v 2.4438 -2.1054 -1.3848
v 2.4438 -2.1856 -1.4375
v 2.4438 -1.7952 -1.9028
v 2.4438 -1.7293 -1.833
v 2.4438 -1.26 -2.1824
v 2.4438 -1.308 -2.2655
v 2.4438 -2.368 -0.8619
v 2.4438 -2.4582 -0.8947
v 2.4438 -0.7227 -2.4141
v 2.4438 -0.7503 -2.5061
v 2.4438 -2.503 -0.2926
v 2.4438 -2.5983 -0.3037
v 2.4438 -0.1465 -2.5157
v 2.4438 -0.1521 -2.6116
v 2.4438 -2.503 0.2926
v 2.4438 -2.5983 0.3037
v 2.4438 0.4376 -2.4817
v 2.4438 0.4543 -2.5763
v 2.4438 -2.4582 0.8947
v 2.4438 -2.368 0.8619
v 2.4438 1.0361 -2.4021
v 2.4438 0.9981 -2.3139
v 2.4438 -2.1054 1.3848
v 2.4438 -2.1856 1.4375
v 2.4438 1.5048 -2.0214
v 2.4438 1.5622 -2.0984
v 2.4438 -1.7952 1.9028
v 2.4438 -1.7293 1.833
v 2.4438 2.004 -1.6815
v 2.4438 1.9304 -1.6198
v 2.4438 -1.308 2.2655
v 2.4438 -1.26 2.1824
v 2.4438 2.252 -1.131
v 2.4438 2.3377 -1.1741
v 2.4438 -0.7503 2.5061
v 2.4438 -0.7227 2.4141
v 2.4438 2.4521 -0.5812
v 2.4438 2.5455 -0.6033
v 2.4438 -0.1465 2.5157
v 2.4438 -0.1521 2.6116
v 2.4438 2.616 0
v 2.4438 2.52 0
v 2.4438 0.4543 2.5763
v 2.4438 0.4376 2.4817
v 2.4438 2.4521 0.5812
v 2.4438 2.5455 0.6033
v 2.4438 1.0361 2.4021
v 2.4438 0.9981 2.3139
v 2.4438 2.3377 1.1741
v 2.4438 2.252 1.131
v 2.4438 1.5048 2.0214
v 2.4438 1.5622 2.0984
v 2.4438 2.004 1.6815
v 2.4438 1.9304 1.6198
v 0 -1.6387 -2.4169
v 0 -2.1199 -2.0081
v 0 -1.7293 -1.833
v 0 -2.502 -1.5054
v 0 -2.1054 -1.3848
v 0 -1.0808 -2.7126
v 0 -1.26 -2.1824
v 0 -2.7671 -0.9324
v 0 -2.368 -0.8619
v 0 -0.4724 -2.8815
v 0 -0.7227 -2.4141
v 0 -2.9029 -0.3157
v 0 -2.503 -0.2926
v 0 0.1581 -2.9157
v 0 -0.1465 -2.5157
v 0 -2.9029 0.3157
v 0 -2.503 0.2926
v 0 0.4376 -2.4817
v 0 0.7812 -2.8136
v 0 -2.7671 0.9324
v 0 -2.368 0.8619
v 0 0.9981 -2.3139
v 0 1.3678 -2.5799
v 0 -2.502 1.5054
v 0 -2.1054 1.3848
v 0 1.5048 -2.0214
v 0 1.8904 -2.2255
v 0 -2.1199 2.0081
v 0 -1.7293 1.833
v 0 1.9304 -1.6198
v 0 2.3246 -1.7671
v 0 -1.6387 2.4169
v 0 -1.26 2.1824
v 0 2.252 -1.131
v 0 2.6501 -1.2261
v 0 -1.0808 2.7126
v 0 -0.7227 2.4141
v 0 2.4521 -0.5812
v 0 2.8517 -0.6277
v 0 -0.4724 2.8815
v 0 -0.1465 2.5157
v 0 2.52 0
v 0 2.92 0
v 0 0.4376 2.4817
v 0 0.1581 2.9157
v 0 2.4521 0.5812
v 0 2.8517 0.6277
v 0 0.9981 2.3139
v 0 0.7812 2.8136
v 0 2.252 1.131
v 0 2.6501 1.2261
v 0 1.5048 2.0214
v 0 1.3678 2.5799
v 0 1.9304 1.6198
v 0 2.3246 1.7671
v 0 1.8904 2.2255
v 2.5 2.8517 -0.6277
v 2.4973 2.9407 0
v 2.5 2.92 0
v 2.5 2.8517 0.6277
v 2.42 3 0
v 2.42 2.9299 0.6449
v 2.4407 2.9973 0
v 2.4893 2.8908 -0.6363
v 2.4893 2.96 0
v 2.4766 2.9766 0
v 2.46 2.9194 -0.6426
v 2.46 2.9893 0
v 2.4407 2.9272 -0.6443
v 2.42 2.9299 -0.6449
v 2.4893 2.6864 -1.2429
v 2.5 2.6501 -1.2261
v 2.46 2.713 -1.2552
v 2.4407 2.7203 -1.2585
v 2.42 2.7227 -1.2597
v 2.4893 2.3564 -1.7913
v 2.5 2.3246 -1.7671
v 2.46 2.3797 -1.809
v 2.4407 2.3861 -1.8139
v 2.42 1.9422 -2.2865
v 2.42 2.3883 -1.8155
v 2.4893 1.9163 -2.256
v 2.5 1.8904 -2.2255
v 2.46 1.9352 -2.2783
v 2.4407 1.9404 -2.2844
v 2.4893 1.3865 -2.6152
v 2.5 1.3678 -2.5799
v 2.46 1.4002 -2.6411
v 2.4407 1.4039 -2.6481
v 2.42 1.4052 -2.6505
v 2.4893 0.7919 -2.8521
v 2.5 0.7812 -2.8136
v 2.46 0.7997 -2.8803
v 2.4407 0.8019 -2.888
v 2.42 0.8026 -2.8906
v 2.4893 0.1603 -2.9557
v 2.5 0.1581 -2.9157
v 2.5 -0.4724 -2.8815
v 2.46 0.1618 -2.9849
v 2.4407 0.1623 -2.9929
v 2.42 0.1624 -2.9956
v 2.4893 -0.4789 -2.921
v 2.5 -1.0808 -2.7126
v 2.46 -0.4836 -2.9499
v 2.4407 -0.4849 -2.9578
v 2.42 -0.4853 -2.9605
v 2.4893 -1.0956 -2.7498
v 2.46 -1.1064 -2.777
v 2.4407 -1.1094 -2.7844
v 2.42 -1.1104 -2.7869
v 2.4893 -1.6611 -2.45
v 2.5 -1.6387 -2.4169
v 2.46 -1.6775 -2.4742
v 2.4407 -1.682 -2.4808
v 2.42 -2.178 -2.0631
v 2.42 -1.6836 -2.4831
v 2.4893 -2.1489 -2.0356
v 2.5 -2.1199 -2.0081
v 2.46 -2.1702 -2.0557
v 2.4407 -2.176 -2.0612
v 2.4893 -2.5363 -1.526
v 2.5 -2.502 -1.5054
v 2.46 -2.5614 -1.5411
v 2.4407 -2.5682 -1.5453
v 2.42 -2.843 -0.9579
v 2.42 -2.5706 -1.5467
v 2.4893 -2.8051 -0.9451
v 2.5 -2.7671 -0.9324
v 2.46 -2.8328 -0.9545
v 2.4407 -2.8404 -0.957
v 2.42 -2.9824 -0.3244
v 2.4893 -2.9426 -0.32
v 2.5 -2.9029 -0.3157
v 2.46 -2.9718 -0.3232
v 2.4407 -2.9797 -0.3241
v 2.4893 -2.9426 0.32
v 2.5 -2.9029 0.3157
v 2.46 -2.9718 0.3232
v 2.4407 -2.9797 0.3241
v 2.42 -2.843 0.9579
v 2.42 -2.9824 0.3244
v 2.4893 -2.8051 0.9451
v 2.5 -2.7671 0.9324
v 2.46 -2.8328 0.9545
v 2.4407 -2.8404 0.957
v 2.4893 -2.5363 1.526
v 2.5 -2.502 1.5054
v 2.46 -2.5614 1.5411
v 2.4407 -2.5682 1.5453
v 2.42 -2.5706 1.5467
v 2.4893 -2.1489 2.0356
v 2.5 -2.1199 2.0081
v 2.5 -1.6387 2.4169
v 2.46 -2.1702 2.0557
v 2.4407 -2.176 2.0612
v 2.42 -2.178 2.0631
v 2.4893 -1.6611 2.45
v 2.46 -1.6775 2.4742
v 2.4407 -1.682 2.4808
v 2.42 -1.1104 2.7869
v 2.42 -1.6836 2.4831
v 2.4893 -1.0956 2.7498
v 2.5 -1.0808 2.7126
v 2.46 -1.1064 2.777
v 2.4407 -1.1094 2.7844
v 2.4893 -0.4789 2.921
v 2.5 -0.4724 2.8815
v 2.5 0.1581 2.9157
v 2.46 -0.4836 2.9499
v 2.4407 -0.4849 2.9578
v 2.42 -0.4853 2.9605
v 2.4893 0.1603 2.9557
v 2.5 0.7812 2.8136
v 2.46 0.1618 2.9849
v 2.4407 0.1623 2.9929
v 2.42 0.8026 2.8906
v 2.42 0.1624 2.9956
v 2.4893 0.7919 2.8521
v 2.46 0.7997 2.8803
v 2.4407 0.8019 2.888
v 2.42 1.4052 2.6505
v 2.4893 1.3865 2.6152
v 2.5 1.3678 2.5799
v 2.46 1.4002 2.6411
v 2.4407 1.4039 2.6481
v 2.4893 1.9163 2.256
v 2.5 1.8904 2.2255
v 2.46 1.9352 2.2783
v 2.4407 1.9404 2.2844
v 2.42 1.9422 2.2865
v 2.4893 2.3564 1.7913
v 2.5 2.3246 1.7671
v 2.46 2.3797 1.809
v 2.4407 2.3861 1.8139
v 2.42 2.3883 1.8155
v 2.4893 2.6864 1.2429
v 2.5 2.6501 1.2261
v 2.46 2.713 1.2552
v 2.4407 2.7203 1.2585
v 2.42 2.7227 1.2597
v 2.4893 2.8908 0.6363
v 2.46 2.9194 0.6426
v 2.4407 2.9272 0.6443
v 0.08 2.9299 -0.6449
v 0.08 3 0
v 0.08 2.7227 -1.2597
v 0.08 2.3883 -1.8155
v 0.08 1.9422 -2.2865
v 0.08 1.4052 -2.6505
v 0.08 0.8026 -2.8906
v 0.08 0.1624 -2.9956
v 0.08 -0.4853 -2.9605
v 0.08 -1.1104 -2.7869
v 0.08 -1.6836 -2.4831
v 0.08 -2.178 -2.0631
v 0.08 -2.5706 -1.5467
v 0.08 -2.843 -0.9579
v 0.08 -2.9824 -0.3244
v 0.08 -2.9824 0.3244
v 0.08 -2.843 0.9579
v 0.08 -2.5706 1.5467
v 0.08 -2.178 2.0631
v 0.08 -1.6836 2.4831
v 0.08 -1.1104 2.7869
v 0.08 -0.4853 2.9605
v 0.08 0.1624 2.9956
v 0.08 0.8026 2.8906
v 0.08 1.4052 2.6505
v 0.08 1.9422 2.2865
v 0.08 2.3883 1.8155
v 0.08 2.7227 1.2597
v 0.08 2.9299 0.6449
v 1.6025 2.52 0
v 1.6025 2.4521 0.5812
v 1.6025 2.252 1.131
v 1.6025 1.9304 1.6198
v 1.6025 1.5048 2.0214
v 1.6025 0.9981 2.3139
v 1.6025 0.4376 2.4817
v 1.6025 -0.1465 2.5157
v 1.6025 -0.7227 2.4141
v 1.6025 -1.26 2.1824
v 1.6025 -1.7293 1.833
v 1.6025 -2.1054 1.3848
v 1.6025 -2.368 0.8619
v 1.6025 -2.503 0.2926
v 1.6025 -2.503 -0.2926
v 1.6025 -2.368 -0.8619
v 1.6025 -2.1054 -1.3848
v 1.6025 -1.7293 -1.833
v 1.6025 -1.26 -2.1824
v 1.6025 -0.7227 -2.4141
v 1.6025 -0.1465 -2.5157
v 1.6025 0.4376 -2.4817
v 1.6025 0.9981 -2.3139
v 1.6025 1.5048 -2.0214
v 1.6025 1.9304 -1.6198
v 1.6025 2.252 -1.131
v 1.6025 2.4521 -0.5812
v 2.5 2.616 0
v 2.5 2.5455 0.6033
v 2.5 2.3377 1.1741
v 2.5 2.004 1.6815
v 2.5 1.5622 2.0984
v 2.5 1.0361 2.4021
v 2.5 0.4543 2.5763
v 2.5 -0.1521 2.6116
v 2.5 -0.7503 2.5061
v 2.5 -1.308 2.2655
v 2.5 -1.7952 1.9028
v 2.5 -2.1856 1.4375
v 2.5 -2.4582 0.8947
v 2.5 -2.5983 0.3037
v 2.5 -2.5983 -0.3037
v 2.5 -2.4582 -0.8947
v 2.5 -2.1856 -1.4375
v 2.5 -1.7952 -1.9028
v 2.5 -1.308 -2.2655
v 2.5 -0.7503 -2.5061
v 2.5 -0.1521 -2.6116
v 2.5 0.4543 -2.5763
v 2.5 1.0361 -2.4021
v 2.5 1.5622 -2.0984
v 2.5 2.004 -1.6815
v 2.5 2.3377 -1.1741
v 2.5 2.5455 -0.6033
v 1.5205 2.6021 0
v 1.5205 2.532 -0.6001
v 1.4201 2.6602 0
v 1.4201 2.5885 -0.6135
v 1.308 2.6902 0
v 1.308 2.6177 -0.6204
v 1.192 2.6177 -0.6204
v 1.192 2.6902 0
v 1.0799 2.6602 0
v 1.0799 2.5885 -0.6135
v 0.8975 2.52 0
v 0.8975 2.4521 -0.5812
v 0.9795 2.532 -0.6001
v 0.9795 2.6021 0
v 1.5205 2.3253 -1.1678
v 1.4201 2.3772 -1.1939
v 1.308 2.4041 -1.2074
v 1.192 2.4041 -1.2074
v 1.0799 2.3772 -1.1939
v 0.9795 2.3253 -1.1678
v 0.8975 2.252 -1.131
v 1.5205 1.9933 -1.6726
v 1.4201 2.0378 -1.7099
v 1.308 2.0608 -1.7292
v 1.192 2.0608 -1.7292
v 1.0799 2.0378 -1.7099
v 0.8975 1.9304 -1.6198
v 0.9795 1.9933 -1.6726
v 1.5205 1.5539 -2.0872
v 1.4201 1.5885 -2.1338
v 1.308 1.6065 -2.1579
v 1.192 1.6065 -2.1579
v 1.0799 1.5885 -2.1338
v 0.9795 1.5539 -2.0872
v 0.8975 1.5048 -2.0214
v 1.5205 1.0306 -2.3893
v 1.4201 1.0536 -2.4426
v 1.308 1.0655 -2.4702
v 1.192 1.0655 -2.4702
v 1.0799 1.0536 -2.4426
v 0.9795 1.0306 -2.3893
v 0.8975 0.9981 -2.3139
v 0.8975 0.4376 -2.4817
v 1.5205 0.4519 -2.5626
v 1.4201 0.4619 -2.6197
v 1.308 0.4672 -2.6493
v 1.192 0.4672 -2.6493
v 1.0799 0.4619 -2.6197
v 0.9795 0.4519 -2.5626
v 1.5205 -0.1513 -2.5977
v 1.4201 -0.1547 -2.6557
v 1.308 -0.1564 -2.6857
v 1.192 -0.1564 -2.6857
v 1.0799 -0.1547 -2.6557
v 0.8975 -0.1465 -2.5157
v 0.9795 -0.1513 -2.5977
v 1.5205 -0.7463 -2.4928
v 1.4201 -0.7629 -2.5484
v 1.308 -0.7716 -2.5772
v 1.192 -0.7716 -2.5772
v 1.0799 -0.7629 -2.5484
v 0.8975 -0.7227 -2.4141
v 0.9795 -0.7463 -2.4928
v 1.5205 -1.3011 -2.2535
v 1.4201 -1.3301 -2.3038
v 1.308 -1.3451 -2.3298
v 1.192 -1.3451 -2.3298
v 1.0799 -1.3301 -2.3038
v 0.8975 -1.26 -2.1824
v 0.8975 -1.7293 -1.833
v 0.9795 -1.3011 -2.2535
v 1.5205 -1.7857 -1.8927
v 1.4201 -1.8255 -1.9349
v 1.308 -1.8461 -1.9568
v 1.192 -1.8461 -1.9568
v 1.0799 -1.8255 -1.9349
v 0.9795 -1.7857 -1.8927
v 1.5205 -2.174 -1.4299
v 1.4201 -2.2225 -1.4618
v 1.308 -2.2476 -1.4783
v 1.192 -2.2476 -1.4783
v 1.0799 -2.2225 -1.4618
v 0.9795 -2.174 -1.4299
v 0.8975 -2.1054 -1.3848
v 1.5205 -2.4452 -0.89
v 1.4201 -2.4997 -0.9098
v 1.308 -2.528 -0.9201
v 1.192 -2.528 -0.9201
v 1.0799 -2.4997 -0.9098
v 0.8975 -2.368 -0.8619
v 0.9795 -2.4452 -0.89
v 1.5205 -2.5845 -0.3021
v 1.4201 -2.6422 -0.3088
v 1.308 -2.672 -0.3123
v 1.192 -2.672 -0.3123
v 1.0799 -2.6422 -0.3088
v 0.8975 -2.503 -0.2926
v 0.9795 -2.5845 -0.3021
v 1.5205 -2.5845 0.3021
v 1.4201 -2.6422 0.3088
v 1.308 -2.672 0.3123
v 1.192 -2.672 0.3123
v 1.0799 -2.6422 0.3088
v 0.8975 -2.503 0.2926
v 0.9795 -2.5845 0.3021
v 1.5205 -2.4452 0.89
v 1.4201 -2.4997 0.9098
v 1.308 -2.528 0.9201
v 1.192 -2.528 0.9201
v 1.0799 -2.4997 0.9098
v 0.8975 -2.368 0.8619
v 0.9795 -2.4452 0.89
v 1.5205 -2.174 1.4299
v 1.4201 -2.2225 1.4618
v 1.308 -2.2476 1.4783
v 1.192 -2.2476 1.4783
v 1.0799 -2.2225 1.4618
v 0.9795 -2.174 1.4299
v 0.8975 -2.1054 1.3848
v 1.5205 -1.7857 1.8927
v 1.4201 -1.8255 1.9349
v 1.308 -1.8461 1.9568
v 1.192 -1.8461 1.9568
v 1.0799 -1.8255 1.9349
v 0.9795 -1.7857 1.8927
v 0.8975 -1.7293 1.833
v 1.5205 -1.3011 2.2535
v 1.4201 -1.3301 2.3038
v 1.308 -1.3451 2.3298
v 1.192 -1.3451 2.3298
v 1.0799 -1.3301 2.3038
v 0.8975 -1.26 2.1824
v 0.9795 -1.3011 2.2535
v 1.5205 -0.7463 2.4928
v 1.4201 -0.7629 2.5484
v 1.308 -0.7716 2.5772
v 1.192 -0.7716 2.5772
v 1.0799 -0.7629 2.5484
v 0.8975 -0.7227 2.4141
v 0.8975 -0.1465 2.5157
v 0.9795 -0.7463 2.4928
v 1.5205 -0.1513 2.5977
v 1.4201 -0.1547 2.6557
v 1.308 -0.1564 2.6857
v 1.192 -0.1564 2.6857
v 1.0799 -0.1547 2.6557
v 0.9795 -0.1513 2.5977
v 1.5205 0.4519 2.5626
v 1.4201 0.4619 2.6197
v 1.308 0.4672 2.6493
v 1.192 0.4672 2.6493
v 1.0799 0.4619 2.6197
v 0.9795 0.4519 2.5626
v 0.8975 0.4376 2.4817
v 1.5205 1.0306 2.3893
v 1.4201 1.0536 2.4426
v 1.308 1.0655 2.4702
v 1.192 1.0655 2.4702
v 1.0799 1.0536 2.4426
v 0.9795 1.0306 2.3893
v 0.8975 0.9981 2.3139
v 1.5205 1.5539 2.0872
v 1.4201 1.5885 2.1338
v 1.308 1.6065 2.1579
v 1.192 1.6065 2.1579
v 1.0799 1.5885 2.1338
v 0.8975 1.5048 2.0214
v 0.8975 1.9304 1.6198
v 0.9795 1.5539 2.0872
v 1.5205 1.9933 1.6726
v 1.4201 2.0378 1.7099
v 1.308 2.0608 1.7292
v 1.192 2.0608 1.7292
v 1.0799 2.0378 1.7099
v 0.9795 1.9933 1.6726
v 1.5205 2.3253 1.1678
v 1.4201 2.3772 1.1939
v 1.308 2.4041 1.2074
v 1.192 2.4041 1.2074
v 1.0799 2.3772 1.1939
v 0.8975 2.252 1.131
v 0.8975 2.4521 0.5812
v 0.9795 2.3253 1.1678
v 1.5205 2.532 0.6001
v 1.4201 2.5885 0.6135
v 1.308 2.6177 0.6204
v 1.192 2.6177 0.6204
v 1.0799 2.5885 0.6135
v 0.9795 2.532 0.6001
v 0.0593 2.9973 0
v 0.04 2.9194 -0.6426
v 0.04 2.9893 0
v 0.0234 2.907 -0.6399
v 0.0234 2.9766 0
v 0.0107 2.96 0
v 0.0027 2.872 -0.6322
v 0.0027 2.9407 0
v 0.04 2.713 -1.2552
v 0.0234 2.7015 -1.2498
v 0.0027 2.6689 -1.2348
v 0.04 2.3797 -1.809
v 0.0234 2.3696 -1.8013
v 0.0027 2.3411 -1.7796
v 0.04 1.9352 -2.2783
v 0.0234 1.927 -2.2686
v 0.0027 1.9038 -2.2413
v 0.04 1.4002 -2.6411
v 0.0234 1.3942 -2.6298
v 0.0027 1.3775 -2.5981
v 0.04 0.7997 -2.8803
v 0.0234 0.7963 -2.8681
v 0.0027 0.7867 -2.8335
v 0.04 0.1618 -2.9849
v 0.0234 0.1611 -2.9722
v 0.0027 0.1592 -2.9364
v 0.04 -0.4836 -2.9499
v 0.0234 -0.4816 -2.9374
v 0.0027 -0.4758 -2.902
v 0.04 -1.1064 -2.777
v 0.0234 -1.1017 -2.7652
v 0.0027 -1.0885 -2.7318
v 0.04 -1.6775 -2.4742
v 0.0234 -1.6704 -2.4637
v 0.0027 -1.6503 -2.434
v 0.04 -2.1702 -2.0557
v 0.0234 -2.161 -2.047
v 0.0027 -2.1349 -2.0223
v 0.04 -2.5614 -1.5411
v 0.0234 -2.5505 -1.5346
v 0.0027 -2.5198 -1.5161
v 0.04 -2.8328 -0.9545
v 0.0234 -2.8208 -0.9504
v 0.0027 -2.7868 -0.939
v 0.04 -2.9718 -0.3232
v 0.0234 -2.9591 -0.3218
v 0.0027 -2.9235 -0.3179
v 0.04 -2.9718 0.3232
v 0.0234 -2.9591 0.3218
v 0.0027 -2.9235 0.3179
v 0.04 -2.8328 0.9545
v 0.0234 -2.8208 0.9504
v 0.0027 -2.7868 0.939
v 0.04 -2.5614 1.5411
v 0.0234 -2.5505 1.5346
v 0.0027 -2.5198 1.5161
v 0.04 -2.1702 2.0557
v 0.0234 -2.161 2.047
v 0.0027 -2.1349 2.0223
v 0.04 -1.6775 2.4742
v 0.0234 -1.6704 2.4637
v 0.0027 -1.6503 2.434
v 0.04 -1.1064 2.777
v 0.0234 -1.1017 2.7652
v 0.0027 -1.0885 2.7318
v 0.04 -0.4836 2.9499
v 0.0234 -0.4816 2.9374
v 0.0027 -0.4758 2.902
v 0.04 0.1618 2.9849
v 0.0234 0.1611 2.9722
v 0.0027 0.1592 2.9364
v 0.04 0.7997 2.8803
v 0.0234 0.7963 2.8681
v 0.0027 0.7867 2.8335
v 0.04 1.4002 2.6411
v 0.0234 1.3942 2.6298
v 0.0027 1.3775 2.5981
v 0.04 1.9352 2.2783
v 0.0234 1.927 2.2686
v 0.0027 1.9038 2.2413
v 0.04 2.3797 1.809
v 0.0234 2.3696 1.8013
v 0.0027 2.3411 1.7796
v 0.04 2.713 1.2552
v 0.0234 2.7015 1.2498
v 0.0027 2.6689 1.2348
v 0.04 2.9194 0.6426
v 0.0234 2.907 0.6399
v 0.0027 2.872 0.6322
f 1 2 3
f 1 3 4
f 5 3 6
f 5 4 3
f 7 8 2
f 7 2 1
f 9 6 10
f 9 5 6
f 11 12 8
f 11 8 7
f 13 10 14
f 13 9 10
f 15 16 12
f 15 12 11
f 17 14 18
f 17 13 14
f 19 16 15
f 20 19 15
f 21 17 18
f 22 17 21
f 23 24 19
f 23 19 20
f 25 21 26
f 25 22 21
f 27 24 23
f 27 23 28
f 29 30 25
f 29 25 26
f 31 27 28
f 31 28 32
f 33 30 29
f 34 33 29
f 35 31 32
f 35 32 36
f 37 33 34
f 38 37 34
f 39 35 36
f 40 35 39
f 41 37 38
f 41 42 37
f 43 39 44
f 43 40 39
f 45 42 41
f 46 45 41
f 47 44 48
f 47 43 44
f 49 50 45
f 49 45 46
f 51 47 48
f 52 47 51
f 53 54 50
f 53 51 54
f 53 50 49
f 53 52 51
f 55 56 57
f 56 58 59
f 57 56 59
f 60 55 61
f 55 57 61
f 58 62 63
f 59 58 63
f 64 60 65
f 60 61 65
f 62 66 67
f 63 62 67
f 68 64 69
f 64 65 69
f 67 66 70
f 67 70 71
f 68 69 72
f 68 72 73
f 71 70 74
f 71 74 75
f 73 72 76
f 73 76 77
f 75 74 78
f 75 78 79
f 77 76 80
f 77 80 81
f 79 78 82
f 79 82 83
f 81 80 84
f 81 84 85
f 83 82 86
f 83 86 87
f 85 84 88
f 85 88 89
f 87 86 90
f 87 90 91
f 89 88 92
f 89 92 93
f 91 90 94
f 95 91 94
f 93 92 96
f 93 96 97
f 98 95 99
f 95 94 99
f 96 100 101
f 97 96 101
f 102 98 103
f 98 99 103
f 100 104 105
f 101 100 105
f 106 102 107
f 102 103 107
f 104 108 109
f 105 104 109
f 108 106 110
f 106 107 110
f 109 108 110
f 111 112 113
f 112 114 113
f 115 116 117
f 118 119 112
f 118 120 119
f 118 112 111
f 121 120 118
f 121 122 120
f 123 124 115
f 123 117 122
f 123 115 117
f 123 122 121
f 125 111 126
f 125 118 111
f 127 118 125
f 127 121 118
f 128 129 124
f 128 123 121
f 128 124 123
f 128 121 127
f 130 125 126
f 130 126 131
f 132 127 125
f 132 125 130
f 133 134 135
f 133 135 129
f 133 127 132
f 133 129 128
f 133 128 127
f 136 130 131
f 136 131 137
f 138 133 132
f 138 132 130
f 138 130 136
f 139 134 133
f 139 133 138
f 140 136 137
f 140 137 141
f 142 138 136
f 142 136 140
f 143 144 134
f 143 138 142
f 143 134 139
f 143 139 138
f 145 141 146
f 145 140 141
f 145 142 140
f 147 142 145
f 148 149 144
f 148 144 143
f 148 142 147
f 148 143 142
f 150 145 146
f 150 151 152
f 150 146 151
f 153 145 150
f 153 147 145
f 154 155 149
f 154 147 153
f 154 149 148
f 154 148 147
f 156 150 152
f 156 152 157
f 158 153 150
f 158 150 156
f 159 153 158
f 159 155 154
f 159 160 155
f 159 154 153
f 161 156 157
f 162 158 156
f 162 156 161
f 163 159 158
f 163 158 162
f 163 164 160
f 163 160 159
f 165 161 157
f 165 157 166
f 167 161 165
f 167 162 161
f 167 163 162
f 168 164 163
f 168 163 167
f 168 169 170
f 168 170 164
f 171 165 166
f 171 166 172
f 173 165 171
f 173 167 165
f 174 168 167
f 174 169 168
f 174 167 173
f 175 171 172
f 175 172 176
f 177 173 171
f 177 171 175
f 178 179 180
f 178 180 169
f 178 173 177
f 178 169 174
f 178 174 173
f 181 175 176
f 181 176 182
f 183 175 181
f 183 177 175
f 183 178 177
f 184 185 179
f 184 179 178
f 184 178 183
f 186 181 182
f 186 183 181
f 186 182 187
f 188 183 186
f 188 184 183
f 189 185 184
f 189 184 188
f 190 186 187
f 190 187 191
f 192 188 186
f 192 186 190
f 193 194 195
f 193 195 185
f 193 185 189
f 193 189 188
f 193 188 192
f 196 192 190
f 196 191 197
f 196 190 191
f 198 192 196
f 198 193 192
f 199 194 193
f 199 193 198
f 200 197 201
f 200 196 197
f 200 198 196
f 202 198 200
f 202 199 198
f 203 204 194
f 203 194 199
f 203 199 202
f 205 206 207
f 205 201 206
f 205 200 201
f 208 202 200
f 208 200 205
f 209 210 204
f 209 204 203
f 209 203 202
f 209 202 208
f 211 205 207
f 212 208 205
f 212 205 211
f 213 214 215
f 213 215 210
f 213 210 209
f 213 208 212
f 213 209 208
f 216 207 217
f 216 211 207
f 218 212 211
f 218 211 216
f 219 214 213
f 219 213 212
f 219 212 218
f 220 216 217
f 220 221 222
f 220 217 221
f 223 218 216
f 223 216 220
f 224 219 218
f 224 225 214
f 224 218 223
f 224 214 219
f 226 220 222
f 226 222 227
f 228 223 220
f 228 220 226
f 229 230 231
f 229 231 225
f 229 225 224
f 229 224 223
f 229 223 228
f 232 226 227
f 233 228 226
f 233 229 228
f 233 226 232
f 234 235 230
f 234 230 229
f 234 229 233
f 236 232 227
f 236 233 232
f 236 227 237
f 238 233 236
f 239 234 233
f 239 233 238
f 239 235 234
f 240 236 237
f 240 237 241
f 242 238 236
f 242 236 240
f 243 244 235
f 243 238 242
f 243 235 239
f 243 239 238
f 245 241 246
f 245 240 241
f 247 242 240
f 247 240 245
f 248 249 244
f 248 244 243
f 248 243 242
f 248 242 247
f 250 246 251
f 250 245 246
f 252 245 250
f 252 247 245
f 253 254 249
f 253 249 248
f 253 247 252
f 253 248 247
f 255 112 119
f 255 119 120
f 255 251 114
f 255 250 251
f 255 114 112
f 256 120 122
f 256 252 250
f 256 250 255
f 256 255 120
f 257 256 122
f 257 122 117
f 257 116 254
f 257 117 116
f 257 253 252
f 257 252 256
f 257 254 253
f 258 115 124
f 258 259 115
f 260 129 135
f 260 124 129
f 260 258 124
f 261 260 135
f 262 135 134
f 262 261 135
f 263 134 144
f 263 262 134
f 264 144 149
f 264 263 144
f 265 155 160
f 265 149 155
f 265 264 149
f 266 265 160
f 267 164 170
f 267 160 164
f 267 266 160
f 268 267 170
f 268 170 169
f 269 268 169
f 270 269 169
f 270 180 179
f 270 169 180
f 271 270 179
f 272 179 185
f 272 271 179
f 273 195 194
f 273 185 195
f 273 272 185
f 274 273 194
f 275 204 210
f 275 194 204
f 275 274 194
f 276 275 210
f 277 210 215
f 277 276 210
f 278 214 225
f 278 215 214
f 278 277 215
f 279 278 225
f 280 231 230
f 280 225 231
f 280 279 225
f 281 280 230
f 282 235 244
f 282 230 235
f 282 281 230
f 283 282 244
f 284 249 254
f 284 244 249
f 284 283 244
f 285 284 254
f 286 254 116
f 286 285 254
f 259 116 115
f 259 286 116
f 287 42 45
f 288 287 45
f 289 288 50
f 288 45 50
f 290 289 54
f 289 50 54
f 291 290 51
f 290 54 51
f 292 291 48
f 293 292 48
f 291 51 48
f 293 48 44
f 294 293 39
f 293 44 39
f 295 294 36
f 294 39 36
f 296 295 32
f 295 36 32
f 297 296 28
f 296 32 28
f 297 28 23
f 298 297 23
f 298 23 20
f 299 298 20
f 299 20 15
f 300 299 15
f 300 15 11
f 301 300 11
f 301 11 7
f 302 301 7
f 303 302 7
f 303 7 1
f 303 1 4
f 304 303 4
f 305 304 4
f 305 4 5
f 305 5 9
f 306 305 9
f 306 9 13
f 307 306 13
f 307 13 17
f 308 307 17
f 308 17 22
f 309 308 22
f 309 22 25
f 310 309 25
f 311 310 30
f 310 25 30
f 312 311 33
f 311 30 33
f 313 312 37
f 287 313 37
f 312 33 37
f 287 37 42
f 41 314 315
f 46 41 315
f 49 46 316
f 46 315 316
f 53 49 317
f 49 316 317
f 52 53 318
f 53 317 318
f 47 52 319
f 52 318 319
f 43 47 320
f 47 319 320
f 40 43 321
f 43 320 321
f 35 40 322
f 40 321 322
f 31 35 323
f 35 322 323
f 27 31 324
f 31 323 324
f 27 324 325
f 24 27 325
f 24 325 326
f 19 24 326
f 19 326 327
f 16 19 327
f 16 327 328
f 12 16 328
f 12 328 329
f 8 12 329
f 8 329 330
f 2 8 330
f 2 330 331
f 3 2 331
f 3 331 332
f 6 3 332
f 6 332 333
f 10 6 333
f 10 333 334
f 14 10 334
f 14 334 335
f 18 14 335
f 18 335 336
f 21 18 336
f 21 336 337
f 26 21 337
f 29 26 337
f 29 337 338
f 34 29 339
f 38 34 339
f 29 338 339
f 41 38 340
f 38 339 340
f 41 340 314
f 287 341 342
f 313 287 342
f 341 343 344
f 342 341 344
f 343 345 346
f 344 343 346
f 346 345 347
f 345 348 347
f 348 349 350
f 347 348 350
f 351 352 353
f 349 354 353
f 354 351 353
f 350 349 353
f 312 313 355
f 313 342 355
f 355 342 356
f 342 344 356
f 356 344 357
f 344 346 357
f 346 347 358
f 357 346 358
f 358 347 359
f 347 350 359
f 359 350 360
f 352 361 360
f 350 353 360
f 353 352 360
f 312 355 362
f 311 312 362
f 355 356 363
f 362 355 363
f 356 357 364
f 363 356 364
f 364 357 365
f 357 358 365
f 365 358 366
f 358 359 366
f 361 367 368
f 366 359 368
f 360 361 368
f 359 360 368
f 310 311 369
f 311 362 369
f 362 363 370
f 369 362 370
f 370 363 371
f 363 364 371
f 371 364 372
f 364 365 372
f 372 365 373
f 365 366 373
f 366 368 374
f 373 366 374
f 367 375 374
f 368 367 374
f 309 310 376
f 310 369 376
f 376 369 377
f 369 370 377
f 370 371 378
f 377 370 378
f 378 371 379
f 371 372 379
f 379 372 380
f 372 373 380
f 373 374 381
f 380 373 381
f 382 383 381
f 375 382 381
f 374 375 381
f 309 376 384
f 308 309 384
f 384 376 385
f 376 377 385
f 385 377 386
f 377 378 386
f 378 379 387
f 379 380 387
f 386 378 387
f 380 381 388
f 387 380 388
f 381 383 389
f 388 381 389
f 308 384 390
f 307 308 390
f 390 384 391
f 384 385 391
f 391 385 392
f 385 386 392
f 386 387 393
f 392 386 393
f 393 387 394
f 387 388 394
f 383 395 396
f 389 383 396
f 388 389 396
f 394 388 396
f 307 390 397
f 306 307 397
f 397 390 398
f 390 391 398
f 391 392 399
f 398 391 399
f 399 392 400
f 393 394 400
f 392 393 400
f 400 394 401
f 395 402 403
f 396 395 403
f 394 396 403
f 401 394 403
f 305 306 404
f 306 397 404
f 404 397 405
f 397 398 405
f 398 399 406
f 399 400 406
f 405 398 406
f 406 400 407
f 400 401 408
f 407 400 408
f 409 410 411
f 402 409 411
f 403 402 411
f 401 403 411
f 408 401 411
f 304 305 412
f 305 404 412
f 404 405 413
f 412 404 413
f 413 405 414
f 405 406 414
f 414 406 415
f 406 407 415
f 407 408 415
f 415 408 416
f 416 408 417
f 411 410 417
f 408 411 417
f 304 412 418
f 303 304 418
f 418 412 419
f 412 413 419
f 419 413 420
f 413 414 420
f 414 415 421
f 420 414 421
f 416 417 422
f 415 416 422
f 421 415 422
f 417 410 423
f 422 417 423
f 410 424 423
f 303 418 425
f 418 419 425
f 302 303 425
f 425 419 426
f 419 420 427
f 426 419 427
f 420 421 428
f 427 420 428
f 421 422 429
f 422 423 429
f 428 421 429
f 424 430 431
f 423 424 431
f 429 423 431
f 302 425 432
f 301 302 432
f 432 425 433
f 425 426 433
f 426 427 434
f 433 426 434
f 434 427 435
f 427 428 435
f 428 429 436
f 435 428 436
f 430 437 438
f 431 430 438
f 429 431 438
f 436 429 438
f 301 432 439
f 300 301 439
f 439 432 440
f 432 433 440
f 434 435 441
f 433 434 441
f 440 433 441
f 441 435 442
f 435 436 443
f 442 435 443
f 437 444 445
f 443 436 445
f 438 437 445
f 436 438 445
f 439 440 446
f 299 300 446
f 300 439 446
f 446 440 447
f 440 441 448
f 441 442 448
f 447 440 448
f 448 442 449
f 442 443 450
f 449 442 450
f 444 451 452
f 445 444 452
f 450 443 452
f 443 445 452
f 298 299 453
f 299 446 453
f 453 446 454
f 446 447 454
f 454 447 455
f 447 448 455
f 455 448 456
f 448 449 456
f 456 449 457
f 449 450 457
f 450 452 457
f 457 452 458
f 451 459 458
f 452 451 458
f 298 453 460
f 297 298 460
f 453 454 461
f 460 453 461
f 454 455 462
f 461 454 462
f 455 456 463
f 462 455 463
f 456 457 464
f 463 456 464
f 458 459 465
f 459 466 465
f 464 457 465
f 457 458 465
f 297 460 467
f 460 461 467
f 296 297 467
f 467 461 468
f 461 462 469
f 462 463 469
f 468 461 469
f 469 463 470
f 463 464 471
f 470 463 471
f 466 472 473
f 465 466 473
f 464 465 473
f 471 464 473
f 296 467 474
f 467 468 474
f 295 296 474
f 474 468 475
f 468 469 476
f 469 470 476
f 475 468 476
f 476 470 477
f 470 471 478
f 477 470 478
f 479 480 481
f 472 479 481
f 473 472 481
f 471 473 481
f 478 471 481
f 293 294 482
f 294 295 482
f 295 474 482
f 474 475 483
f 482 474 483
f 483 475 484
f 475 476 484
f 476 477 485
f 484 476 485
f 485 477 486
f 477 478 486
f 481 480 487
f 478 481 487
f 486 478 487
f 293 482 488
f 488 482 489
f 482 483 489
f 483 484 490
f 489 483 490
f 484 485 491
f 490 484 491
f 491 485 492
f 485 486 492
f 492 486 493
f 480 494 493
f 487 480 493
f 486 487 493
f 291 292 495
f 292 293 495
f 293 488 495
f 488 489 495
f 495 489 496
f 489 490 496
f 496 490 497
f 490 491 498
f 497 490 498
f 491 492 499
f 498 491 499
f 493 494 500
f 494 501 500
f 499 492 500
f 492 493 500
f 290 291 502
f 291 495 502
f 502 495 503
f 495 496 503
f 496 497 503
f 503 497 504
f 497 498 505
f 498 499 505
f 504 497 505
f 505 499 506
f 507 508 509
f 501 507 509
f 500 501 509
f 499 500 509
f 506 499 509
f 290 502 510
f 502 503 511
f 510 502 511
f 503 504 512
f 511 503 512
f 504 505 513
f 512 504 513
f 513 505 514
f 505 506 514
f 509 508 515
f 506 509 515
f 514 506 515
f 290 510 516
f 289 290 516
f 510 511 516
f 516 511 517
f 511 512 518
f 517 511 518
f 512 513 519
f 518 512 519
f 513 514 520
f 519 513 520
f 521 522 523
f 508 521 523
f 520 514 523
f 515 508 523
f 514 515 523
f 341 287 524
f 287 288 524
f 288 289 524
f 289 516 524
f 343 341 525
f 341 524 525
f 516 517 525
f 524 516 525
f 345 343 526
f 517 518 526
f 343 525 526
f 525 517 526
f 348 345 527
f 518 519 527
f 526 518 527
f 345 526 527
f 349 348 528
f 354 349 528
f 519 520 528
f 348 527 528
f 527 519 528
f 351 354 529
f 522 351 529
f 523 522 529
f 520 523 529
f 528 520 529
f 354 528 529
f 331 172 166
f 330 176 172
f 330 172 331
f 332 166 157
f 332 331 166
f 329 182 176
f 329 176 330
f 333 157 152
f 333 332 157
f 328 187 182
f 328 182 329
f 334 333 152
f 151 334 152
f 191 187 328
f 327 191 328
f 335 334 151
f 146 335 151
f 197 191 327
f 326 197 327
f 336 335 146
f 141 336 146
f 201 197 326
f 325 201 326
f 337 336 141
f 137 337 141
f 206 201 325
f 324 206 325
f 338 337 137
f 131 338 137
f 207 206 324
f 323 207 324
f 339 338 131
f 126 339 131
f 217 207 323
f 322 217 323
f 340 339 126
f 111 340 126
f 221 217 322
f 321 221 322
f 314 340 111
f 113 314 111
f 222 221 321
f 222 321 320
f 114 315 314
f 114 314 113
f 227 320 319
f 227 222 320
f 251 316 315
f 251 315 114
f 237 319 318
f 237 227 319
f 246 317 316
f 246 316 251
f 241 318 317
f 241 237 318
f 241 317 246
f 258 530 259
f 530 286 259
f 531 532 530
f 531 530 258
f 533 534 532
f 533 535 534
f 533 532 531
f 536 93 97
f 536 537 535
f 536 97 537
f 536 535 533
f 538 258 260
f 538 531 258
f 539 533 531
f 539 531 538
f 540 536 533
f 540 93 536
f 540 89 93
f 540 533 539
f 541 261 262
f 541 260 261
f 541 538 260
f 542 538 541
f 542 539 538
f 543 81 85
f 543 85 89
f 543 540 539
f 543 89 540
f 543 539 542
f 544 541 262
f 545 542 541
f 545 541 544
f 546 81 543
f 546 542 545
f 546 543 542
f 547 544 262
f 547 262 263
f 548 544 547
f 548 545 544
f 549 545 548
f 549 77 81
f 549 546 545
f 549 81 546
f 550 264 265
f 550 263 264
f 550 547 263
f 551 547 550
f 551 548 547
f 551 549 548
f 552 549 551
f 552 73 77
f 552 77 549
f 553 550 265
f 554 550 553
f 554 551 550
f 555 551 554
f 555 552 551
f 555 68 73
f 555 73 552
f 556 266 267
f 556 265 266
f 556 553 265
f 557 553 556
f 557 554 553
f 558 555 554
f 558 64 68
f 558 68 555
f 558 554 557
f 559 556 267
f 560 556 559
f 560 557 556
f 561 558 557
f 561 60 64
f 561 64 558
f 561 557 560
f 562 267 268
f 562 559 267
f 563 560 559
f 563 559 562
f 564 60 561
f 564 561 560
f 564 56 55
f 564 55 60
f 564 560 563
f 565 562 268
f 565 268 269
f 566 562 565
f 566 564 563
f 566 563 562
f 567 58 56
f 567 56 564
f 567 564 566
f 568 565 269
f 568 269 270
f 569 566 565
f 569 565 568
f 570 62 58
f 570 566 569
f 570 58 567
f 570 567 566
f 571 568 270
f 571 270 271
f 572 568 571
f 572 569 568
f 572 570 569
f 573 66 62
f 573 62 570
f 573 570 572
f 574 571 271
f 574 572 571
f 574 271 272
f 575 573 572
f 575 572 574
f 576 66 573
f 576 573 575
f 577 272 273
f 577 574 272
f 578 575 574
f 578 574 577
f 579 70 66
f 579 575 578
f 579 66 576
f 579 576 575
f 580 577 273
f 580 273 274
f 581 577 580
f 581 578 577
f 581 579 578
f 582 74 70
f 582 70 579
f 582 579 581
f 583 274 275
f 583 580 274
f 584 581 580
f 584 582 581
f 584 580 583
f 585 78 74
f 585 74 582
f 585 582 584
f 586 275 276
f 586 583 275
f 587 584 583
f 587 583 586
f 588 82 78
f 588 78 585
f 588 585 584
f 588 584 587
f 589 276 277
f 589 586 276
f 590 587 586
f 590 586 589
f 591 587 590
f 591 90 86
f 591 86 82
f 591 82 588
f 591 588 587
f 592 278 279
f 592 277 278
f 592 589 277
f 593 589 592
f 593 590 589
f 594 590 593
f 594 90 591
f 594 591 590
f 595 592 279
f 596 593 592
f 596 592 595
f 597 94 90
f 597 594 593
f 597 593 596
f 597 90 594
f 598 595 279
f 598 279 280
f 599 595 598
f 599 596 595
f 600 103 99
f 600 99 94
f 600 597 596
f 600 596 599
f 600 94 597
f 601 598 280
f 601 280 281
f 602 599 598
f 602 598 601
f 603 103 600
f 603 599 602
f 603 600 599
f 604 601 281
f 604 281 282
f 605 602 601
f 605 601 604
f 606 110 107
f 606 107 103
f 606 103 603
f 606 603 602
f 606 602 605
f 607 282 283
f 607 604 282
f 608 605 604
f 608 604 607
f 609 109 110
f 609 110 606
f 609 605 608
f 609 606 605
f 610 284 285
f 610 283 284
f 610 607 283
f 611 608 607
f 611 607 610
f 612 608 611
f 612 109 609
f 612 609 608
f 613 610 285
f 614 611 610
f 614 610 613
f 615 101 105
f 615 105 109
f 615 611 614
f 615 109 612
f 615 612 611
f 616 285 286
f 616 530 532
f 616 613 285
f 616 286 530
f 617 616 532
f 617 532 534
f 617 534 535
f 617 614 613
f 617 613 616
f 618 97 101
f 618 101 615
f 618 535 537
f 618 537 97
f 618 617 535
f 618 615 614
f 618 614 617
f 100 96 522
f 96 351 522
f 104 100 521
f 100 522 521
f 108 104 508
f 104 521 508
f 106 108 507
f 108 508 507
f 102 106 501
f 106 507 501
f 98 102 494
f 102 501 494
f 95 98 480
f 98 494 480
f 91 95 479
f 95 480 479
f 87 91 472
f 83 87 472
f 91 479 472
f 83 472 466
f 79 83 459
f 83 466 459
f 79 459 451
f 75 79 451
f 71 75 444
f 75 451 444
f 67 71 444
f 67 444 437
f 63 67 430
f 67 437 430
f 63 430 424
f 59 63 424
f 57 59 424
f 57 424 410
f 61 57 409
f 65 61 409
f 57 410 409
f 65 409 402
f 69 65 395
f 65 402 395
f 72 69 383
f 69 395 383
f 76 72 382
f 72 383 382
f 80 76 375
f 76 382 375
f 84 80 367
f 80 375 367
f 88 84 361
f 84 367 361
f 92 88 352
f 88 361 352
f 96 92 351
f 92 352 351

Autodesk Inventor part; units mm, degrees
sketch "Sketch_2" plane through (0, 0, 0) normal (0, 0, 1) x (1, 0, 0)
  line L0 (2.5, 0) -> (0, 0)
  line L1 (0, 2.92) -> (0, 2.52)
  line L2 (0, 2.52) -> (0.8975, 2.52)
  arc A0 (1.6025, 2.52) -> (0.8975, 2.52) centre (1.25, 2.25) ccw
  line L3 (1.6025, 2.52) -> (2.4438, 2.52)
  line L4 (2.4438, 2.52) -> (2.4438, 2.616)
  line L5 (2.4438, 2.616) -> (2.5, 2.616)
  line L6 (2.5, 2.616) -> (2.5, 2.92)
  arc A1 (2.5, 2.92) -> (2.42, 3) centre (2.42, 2.92) ccw
  line L7 (2.42, 3) -> (0.08, 3)
  arc A2 (0.08, 3) -> (0, 2.92) centre (0.08, 2.92) ccw
revolve "Revolution1" add sketch "Sketch_2" angle 360 about axis through (2.5, 0, 0) along (1, 0, 0)
ref_plane "mss_or_XY" through (0, 0, 0) normal (1, 0, 0) x (0, 0, -1)
ref_plane "mss_or_YZ" through (0, 0, 0) normal (0, 0, -1) x (0, 1, 0)
ref_plane "mss_or_ZX" through (0, 0, 0) normal (0, 1, 0) x (1, 0, 0)
ref_plane "mss_or11_XY" through (2.5, 0, 0) normal (1, 0, 0) x (0, 0, -1)
ref_plane "mss_or11_YZ" through (2.5, 0, 0) normal (0, 0, -1) x (0, 1, 0)
ref_plane "mss_or11_ZX" through (2.5, 0, 0) normal (0, 1, 0) x (1, 0, 0)
ref_plane "mss_or2_1_XY" through (1, 2.25, 0) normal (1, 0, 0) x (0, 0, -1)
ref_plane "mss_or2_1_YZ" through (1, 2.25, 0) normal (0, 0, -1) x (0, 1, 0)
ref_plane "mss_or2_1_ZX" through (1, 2.25, 0) normal (0, 1, 0) x (1, 0, 0)
ref_plane "mss_or2_2_XY" through (1, 1.7236, 1.4463) normal (1, 0, 0) x (0, 0, -1)
ref_plane "mss_or2_2_YZ" through (1, 1.7236, 1.4463) normal (0, 0, -1) x (0, 1, 0)
ref_plane "mss_or2_2_ZX" through (1, 1.7236, 1.4463) normal (0, 1, 0) x (1, 0, 0)
ref_plane "mss_or2_3_XY" through (1, 0.3907, 2.2158) normal (1, 0, 0) x (0, 0, -1)
ref_plane "mss_or2_3_YZ" through (1, 0.3907, 2.2158) normal (0, 0, -1) x (0, 1, 0)
ref_plane "mss_or2_3_ZX" through (1, 0.3907, 2.2158) normal (0, 1, 0) x (1, 0, 0)
ref_plane "mss_or2_4_XY" through (1, -1.125, 1.9486) normal (1, 0, 0) x (0, 0, -1)
ref_plane "mss_or2_4_YZ" through (1, -1.125, 1.9486) normal (0, 0, -1) x (0, 1, 0)
ref_plane "mss_or2_4_ZX" through (1, -1.125, 1.9486) normal (0, 1, 0) x (1, 0, 0)
ref_plane "mss_or2_5_XY" through (1, -2.1143, 0.7695) normal (1, 0, 0) x (0, 0, -1)
ref_plane "mss_or2_5_YZ" through (1, -2.1143, 0.7695) normal (0, 0, -1) x (0, 1, 0)
ref_plane "mss_or2_5_ZX" through (1, -2.1143, 0.7695) normal (0, 1, 0) x (1, 0, 0)
ref_plane "mss_or2_6_XY" through (1, -2.1143, -0.7695) normal (1, 0, 0) x (0, 0, -1)
ref_plane "mss_or2_6_YZ" through (1, -2.1143, -0.7695) normal (0, 0, -1) x (0, 1, 0)
ref_plane "mss_or2_6_ZX" through (1, -2.1143, -0.7695) normal (0, 1, 0) x (1, 0, 0)
ref_plane "mss_or2_7_XY" through (1, -1.125, -1.9486) normal (1, 0, 0) x (0, 0, -1)
ref_plane "mss_or2_7_YZ" through (1, -1.125, -1.9486) normal (0, 0, -1) x (0, 1, 0)
ref_plane "mss_or2_7_ZX" through (1, -1.125, -1.9486) normal (0, 1, 0) x (1, 0, 0)
ref_plane "mss_or2_8_XY" through (1, 0.3907, -2.2158) normal (1, 0, 0) x (0, 0, -1)
ref_plane "mss_or2_8_YZ" through (1, 0.3907, -2.2158) normal (0, 0, -1) x (0, 1, 0)
ref_plane "mss_or2_8_ZX" through (1, 0.3907, -2.2158) normal (0, 1, 0) x (1, 0, 0)
ref_plane "mss_or2_9_XY" through (1, 1.7236, -1.4463) normal (1, 0, 0) x (0, 0, -1)
ref_plane "mss_or2_9_YZ" through (1, 1.7236, -1.4463) normal (0, 0, -1) x (0, 1, 0)
ref_plane "mss_or2_9_ZX" through (1, 1.7236, -1.4463) normal (0, 1, 0) x (1, 0, 0)
ref_plane "mss_or21_1_XY" through (1.25, 2.25, 0) normal (1, 0, 0) x (0, 0, -1)
ref_plane "mss_or21_1_YZ" through (1.25, 2.25, 0) normal (0, 0, -1) x (0, 1, 0)
ref_plane "mss_or21_1_ZX" through (1.25, 2.25, 0) normal (0, 1, 0) x (1, 0, 0)
ref_plane "mss_or21_2_XY" through (1.25, 1.7236, 1.4463) normal (1, 0, 0) x (0, 0, -1)
ref_plane "mss_or21_2_YZ" through (1.25, 1.7236, 1.4463) normal (0, 0, -1) x (0, 1, 0)
ref_plane "mss_or21_2_ZX" through (1.25, 1.7236, 1.4463) normal (0, 1, 0) x (1, 0, 0)
ref_plane "mss_or21_3_XY" through (1.25, 0.3907, 2.2158) normal (1, 0, 0) x (0, 0, -1)
ref_plane "mss_or21_3_YZ" through (1.25, 0.3907, 2.2158) normal (0, 0, -1) x (0, 1, 0)
ref_plane "mss_or21_3_ZX" through (1.25, 0.3907, 2.2158) normal (0, 1, 0) x (1, 0, 0)
ref_plane "mss_or21_4_XY" through (1.25, -1.125, 1.9486) normal (1, 0, 0) x (0, 0, -1)
ref_plane "mss_or21_4_YZ" through (1.25, -1.125, 1.9486) normal (0, 0, -1) x (0, 1, 0)
ref_plane "mss_or21_4_ZX" through (1.25, -1.125, 1.9486) normal (0, 1, 0) x (1, 0, 0)
ref_plane "mss_or21_5_XY" through (1.25, -2.1143, 0.7695) normal (1, 0, 0) x (0, 0, -1)
ref_plane "mss_or21_5_YZ" through (1.25, -2.1143, 0.7695) normal (0, 0, -1) x (0, 1, 0)
ref_plane "mss_or21_5_ZX" through (1.25, -2.1143, 0.7695) normal (0, 1, 0) x (1, 0, 0)
ref_plane "mss_or21_6_XY" through (1.25, -2.1143, -0.7695) normal (1, 0, 0) x (0, 0, -1)
ref_plane "mss_or21_6_YZ" through (1.25, -2.1143, -0.7695) normal (0, 0, -1) x (0, 1, 0)
ref_plane "mss_or21_6_ZX" through (1.25, -2.1143, -0.7695) normal (0, 1, 0) x (1, 0, 0)
ref_plane "mss_or21_7_XY" through (1.25, -1.125, -1.9486) normal (1, 0, 0) x (0, 0, -1)
ref_plane "mss_or21_7_YZ" through (1.25, -1.125, -1.9486) normal (0, 0, -1) x (0, 1, 0)
ref_plane "mss_or21_7_ZX" through (1.25, -1.125, -1.9486) normal (0, 1, 0) x (1, 0, 0)
ref_plane "mss_or21_8_XY" through (1.25, 0.3907, -2.2158) normal (1, 0, 0) x (0, 0, -1)
ref_plane "mss_or21_8_YZ" through (1.25, 0.3907, -2.2158) normal (0, 0, -1) x (0, 1, 0)
ref_plane "mss_or21_8_ZX" through (1.25, 0.3907, -2.2158) normal (0, 1, 0) x (1, 0, 0)
ref_plane "mss_or21_9_XY" through (1.25, 1.7236, -1.4463) normal (1, 0, 0) x (0, 0, -1)
ref_plane "mss_or21_9_YZ" through (1.25, 1.7236, -1.4463) normal (0, 0, -1) x (0, 1, 0)
ref_plane "mss_or21_9_ZX" through (1.25, 1.7236, -1.4463) normal (0, 1, 0) x (1, 0, 0)
properties part number "WA673SA Outer ring"
